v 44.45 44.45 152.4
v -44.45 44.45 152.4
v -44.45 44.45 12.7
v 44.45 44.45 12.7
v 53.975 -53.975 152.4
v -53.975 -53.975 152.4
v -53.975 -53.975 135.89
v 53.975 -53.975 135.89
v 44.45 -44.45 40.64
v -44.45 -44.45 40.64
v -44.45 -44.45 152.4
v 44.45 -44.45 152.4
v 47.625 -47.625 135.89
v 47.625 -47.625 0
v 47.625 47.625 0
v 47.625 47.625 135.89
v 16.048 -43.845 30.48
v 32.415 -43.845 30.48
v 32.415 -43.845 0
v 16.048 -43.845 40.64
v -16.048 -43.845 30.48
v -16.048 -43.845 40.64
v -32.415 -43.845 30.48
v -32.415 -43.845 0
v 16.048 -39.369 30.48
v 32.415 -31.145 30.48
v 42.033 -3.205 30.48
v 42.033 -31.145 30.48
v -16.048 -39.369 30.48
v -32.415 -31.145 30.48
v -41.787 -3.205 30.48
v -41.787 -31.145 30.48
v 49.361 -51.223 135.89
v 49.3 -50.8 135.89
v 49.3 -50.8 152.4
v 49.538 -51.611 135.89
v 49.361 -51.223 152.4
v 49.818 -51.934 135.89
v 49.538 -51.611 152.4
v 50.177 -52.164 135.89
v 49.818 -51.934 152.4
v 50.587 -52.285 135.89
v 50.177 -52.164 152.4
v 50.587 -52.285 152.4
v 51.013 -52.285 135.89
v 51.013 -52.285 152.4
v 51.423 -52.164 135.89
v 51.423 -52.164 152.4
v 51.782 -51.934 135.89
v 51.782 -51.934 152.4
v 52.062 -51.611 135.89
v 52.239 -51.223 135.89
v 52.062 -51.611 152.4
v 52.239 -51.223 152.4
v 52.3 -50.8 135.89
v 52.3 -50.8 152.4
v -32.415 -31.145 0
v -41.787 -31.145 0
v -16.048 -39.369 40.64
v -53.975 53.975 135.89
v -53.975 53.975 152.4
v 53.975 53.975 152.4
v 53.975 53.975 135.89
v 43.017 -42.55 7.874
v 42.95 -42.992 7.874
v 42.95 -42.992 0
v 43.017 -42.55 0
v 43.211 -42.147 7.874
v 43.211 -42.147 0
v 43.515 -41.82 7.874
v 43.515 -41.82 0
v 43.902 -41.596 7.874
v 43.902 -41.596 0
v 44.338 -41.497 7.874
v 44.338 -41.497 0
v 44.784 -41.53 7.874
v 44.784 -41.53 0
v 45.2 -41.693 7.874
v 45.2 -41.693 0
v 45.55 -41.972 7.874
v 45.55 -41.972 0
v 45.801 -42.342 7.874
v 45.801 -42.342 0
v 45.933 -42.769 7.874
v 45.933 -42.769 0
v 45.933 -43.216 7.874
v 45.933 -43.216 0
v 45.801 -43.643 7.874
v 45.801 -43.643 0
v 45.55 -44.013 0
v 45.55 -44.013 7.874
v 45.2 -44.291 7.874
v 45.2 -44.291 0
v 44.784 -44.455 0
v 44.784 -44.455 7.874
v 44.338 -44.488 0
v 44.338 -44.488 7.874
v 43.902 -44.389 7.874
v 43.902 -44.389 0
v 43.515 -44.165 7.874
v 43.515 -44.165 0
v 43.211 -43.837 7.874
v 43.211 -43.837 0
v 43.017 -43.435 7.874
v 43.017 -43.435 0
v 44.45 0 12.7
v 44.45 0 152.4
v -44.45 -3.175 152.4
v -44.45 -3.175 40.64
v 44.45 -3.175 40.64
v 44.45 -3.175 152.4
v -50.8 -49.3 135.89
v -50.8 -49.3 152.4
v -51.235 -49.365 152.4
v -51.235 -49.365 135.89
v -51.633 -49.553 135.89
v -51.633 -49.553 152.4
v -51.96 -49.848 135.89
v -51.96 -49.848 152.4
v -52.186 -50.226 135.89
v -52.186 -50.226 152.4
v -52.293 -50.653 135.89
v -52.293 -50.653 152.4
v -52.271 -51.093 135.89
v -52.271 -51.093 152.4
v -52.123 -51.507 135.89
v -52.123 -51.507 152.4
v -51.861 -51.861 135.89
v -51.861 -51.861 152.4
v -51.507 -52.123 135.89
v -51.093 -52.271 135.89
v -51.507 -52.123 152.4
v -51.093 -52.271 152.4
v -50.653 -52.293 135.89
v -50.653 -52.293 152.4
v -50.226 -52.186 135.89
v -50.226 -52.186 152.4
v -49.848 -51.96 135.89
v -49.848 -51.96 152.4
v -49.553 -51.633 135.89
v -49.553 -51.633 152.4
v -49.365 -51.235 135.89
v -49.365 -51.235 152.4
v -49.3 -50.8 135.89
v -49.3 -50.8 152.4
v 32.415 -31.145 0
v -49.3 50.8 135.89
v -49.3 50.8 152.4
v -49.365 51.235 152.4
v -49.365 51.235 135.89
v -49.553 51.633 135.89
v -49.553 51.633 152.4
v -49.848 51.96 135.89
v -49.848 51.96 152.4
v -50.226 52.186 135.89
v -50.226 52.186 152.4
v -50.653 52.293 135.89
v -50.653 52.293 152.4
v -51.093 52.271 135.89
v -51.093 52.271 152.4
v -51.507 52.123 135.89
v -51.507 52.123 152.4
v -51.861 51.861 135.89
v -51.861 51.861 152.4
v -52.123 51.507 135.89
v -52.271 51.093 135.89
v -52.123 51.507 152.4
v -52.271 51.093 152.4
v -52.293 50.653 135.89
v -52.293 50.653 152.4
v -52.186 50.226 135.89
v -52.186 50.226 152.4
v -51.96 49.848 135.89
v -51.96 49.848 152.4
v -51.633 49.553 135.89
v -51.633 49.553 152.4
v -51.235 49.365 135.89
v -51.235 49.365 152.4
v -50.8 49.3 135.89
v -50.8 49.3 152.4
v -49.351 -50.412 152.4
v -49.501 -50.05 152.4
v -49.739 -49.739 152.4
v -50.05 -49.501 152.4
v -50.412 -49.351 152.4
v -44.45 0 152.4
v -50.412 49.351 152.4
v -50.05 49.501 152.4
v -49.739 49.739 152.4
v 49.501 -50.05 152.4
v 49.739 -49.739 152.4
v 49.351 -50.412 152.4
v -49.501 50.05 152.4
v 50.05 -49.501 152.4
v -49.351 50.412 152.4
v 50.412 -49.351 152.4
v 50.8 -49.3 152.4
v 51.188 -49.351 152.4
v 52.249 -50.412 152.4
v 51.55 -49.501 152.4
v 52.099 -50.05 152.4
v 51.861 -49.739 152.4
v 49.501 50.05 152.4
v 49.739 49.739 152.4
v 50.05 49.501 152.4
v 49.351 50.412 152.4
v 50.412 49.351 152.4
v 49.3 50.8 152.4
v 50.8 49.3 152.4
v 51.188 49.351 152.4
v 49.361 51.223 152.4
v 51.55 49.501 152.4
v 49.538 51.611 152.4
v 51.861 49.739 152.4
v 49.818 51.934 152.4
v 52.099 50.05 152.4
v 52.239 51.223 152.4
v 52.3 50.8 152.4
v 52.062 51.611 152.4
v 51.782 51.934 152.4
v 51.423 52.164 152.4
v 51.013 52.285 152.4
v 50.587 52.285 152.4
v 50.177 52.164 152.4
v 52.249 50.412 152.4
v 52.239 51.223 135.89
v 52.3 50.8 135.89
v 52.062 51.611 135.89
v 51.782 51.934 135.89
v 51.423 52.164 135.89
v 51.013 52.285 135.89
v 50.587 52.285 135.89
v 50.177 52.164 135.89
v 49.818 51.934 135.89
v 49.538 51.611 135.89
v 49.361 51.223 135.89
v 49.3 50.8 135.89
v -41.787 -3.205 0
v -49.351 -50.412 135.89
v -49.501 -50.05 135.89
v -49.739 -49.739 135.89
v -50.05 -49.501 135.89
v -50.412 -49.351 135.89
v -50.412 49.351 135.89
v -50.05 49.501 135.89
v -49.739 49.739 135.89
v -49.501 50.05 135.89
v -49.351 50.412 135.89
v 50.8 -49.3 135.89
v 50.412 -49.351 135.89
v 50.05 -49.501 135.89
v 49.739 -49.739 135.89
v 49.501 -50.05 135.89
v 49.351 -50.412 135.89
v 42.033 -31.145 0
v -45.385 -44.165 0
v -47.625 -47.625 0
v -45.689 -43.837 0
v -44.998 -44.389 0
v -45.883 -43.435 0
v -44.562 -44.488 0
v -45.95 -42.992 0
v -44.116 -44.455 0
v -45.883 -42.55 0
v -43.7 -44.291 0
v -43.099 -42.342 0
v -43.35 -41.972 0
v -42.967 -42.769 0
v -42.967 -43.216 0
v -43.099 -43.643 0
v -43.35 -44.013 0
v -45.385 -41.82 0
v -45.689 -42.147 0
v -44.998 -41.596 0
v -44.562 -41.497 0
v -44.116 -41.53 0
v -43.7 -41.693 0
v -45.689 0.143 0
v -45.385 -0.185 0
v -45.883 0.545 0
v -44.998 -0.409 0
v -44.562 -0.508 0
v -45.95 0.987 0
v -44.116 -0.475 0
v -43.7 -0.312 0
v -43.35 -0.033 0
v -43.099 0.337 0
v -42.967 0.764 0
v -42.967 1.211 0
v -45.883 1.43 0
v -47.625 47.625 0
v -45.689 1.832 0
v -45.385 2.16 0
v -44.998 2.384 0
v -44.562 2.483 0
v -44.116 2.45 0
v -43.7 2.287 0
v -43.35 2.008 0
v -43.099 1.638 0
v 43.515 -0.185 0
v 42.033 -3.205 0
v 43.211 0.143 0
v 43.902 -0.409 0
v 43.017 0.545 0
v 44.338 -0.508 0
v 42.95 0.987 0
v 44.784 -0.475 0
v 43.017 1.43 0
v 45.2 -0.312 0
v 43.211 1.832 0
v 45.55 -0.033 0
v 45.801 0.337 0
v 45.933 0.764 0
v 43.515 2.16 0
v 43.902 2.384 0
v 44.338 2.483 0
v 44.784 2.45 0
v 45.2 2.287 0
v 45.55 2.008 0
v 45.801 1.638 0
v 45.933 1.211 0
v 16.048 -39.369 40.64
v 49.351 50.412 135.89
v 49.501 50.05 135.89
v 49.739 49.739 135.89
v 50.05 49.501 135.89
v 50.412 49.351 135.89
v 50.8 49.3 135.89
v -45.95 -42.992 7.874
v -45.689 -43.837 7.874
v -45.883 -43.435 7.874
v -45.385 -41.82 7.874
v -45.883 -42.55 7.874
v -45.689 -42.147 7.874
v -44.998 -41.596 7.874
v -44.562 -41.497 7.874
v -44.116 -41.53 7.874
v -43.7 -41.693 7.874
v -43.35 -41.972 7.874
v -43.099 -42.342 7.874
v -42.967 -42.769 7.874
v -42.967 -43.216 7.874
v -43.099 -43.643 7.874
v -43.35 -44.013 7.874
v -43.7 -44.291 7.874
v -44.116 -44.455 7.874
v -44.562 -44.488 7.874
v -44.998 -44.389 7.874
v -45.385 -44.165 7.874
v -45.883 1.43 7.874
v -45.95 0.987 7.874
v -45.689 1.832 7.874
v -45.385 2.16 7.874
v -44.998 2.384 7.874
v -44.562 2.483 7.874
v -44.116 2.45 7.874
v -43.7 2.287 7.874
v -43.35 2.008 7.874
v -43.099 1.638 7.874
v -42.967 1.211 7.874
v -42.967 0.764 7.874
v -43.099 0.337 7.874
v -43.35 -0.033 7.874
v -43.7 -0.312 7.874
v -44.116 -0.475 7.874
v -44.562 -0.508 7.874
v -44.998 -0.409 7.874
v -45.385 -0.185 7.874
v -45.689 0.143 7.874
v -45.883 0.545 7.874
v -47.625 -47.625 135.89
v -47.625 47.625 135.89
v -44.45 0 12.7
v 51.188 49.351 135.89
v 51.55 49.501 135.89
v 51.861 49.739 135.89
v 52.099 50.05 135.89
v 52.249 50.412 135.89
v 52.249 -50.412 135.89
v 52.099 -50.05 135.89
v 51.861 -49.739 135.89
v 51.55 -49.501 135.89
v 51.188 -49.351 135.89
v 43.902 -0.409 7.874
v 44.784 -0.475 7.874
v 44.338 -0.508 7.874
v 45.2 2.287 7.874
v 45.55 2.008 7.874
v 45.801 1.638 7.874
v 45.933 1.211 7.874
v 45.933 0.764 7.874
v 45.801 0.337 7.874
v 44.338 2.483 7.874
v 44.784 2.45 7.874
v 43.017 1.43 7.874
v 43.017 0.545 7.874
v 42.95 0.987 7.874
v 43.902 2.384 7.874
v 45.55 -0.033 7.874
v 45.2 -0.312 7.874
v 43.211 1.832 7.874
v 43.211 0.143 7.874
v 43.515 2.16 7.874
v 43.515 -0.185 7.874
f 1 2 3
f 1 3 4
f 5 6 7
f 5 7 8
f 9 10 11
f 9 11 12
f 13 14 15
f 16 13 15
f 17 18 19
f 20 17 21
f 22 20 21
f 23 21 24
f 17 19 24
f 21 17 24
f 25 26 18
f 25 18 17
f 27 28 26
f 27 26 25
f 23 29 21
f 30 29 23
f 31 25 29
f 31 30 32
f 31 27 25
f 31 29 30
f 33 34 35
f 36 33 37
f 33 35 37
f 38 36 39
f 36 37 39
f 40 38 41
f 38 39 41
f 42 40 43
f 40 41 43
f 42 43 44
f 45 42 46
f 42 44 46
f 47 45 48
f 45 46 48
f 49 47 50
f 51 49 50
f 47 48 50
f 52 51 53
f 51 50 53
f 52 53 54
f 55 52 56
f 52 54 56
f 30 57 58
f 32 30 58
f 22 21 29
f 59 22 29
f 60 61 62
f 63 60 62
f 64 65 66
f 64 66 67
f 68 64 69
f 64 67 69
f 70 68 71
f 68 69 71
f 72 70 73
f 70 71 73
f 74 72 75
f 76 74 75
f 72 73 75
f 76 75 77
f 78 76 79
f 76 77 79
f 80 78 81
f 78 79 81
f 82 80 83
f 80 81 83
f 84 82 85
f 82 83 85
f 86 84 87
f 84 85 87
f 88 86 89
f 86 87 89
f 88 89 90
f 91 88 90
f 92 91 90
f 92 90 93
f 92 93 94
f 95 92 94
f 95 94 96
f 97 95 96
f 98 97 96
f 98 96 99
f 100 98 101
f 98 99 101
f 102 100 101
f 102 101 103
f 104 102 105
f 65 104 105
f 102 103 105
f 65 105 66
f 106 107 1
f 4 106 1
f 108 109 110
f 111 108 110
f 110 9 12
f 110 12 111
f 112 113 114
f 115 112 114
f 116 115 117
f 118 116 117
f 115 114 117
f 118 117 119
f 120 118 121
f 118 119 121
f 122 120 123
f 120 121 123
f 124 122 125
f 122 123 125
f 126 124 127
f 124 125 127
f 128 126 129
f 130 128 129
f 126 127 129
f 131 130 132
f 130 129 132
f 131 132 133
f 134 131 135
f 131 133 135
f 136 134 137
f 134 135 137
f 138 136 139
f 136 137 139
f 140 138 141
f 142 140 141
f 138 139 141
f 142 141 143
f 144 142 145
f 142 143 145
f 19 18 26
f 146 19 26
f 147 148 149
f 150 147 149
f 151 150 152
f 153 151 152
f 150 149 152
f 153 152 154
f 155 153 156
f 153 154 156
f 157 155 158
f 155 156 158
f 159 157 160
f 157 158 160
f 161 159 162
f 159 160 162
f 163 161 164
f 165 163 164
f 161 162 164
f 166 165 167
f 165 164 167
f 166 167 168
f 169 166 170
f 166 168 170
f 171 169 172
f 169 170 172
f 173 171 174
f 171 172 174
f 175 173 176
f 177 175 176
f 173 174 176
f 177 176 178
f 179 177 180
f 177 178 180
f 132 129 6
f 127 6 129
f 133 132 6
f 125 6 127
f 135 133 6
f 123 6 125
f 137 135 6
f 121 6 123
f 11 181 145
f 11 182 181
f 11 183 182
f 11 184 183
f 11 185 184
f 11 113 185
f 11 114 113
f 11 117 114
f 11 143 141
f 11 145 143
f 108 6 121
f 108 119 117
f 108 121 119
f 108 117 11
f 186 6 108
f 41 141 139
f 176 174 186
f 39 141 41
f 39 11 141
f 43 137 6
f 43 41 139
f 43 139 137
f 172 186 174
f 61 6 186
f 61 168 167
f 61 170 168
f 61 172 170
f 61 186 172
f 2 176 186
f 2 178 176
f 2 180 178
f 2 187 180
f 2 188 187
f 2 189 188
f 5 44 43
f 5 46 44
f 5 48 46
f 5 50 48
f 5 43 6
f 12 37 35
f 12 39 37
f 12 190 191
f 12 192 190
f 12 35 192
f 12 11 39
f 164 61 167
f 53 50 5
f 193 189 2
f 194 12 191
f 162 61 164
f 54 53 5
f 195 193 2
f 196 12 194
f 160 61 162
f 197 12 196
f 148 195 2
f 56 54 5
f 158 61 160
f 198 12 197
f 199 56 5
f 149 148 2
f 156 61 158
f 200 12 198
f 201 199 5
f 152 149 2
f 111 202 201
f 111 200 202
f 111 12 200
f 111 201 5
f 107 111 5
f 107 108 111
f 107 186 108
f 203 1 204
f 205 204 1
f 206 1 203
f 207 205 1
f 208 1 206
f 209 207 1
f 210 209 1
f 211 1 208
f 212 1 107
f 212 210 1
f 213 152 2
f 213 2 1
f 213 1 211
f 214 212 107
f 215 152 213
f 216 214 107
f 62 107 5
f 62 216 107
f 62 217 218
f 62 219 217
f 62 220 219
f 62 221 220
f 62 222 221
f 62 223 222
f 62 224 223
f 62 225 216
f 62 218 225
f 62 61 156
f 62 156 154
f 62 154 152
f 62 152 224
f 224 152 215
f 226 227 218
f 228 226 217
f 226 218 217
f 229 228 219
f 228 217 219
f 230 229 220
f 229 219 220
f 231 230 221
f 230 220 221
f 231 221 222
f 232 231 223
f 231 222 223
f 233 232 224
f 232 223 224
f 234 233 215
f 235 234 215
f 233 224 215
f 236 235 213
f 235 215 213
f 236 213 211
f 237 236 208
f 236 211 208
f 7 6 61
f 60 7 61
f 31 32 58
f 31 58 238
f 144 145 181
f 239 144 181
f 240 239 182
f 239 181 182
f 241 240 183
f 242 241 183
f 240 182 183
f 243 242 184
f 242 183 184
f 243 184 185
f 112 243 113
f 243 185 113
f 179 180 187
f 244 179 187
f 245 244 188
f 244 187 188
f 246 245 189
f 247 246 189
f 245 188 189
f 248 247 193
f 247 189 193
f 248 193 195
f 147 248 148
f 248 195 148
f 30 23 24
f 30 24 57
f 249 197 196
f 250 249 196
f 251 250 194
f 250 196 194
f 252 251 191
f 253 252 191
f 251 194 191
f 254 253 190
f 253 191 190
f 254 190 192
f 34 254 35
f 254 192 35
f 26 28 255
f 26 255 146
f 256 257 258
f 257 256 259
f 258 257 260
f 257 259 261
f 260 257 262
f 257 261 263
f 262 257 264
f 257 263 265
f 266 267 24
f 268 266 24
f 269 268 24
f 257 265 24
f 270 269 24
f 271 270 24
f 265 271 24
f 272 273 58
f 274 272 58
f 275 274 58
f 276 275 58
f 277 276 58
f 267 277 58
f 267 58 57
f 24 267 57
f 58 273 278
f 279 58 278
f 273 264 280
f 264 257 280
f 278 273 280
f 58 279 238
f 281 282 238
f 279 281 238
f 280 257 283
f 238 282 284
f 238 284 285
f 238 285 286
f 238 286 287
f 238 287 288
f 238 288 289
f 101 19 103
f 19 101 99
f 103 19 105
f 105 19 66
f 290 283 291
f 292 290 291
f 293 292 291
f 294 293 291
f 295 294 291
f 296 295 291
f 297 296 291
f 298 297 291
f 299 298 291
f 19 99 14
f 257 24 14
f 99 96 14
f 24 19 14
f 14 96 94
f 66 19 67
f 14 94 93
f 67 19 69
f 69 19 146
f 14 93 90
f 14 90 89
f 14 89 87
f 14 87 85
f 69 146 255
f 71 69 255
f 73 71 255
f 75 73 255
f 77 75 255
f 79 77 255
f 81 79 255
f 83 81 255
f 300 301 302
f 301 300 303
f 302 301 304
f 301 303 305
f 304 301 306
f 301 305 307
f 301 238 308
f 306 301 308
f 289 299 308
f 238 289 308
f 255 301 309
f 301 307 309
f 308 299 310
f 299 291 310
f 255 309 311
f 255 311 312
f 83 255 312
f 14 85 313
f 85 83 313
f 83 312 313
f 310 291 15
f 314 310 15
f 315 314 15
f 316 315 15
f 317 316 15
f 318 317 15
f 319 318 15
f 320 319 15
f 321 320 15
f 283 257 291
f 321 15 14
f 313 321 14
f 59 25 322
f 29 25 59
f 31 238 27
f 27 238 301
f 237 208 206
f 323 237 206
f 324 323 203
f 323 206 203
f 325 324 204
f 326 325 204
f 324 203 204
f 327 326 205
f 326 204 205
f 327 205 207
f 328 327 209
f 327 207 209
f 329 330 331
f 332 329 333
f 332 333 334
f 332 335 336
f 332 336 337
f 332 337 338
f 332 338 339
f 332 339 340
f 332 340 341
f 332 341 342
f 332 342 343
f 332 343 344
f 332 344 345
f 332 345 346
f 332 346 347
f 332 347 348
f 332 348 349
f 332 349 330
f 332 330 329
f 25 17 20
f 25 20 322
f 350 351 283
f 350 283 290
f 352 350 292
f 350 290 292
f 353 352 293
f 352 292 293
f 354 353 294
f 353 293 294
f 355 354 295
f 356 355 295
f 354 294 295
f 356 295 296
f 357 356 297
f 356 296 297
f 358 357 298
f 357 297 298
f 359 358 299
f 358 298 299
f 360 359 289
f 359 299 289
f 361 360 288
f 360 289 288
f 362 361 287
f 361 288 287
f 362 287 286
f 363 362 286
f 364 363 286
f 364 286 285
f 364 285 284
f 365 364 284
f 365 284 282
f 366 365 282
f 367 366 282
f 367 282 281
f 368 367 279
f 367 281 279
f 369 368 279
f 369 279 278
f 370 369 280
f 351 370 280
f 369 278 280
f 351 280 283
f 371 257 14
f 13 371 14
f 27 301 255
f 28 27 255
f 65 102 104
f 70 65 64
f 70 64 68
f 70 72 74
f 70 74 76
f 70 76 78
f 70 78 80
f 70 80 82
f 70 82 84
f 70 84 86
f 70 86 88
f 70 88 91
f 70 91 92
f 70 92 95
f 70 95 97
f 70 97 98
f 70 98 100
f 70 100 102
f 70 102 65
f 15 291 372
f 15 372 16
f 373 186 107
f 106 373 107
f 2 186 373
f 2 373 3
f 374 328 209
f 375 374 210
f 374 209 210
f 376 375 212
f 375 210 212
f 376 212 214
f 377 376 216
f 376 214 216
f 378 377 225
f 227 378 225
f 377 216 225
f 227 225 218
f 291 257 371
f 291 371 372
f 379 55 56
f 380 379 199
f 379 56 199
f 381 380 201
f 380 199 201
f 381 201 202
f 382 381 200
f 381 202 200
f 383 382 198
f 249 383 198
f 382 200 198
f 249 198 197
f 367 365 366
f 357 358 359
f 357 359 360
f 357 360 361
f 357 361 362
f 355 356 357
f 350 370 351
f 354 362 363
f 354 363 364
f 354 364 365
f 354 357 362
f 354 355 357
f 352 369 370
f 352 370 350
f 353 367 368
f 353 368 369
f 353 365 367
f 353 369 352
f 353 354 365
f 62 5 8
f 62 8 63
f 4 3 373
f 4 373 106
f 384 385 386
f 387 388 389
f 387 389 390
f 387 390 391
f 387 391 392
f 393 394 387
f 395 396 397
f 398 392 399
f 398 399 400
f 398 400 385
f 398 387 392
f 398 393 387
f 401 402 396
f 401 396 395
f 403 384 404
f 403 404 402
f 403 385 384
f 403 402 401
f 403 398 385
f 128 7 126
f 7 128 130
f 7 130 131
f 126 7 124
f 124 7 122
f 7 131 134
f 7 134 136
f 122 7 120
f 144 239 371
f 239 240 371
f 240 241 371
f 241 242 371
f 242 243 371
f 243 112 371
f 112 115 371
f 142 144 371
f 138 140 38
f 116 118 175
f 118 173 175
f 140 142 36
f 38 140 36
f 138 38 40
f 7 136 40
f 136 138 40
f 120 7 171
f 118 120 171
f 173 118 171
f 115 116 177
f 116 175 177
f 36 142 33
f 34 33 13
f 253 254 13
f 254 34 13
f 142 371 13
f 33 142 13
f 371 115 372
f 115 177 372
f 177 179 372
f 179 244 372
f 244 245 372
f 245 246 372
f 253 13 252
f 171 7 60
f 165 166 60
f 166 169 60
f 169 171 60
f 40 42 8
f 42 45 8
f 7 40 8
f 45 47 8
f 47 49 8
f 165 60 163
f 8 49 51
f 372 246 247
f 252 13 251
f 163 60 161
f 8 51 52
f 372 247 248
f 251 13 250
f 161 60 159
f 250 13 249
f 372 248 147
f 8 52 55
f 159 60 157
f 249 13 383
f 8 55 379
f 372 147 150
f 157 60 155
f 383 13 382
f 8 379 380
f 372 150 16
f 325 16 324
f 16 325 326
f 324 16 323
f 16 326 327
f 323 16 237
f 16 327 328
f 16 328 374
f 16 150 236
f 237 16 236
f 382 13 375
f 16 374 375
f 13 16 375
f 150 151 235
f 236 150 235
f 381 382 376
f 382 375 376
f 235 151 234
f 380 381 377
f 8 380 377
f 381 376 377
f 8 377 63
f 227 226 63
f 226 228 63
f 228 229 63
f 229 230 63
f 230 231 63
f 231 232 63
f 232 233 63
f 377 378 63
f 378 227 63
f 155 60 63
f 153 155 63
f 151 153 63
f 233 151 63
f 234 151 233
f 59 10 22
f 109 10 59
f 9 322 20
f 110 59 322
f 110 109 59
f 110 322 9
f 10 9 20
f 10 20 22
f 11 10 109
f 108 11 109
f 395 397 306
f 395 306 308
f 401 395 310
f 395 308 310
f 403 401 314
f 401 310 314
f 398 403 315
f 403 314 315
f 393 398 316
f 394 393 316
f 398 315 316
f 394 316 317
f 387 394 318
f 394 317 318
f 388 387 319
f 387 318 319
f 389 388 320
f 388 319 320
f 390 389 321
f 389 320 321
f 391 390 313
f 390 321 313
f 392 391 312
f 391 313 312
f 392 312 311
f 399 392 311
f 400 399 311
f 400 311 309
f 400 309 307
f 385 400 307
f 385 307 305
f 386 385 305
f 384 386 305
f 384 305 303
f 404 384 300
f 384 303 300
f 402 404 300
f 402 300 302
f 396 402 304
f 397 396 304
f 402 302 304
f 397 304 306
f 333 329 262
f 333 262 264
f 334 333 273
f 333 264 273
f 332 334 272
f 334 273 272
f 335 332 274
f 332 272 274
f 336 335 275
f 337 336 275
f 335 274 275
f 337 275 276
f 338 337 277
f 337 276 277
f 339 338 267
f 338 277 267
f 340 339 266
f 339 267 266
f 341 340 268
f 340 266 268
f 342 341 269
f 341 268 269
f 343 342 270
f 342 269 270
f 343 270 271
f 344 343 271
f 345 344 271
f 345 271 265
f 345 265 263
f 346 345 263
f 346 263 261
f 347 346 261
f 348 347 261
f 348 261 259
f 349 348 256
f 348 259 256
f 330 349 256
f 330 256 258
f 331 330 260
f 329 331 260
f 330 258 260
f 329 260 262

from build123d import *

# Parameters (mm, degrees)
SKETCH1_W           = 95.25
SKETCH1_H           = 95.25
BOSS_EXTRUDE1_DEPTH = 152.4
SKETCH2_W           = 88.9
SKETCH2_H           = 44.45
CUT_EXTRUDE1_DEPTH  = 139.7
SKETCH2_3_W         = 88.9
SKETCH2_3_H         = 41.275
CUT_EXTRUDE2_DEPTH  = 111.76
SKETCH5_W           = 107.95
SKETCH5_H           = 107.95
SKETCH5_W_2         = 88.9
SKETCH5_H_2         = 88.9
BOSS_EXTRUDE2_DEPTH = 16.51
SKETCH6_R           = 1.5
CUT_EXTRUDE5_DEPTH  = 16.51
SKETCH7_R           = 1.5
CUT_EXTRUDE6_DEPTH  = 7.874
CUT_EXTRUDE7_DEPTH  = 30.48
SKETCH8_W           = 32.09515361
SKETCH8_H           = 4.475150354
CUT_EXTRUDE8_DEPTH  = 30.48


with BuildPart() as part:
    # Sketch1 → Boss-Extrude1 (new body)
    with BuildSketch(Plane.XY):
        Rectangle(SKETCH1_W, SKETCH1_H)
    extrude(amount=BOSS_EXTRUDE1_DEPTH)

    # Sketch2 → Cut-Extrude1 (cut)
    with BuildSketch(Plane.XY.offset(152.4)):
        with Locations((0, 22.225)):
            Rectangle(SKETCH2_W, SKETCH2_H)
    extrude(amount=-CUT_EXTRUDE1_DEPTH, mode=Mode.SUBTRACT)

    # Sketch2<3> → Cut-Extrude2 (cut)
    with BuildSketch(Plane.XY.offset(152.4)):
        with Locations((0, -23.8125)):
            Rectangle(SKETCH2_3_W, SKETCH2_3_H)
    extrude(amount=-CUT_EXTRUDE2_DEPTH, mode=Mode.SUBTRACT)

    # Sketch5 → Boss-Extrude2 (add)
    with BuildSketch(Plane.XY.offset(152.4)):
        Rectangle(SKETCH5_W, SKETCH5_H)
        Rectangle(SKETCH5_W_2, SKETCH5_H_2, mode=Mode.SUBTRACT)
    extrude(amount=-BOSS_EXTRUDE2_DEPTH)

    # Sketch6 → Cut-Extrude5 (cut)
    with BuildSketch(Plane.XY.offset(152.4)):
        with Locations((-50.8, 50.8)):
            Circle(SKETCH6_R)
        with Locations((50.8, 50.8)):
            Circle(SKETCH6_R)
        with Locations((-50.8, -50.8)):
            Circle(SKETCH6_R)
        with Locations((50.8, -50.8)):
            Circle(SKETCH6_R)
    extrude(amount=-CUT_EXTRUDE5_DEPTH, mode=Mode.SUBTRACT)

    # Sketch7 → Cut-Extrude6 (cut)
    with BuildSketch(Plane(origin=(0, 0, 0), x_dir=(-1, 0, 0), z_dir=(0, 0, -1))):
        with Locations((-44.45, 0.987495031)):
            Circle(SKETCH7_R)
        with Locations((44.45, 0.987495031)):
            Circle(SKETCH7_R)
        with Locations((44.45, -42.992427459)):
            Circle(SKETCH7_R)
        with Locations((-44.45, -42.992427459)):
            Circle(SKETCH7_R)
    extrude(amount=-CUT_EXTRUDE6_DEPTH, mode=Mode.SUBTRACT)

    # Sketch3 → Cut-Extrude7 (cut)
    with BuildSketch(Plane(origin=(0, 0, 0), x_dir=(-1, 0, 0), z_dir=(0, 0, -1))):
        Polygon((41.787446397, -3.204523257), (-42.032553603, -3.204523257), (-42.032553603, -31.144523257), (-32.415427886, -31.144523257), (-32.415427886, -43.844523257), (32.415427886, -43.844523257), (32.415427886, -31.144523257), (41.787446397, -31.144523257), align=None)
    extrude(amount=-CUT_EXTRUDE7_DEPTH, mode=Mode.SUBTRACT)

    # Sketch8 → Cut-Extrude8 (cut)
    with BuildSketch(Plane(origin=(0, 0, 30.48), x_dir=(-1, 0, 0), z_dir=(0, 0, -1))):
        with Locations((0, -41.60694808)):
            Rectangle(SKETCH8_W, SKETCH8_H)
    extrude(amount=-CUT_EXTRUDE8_DEPTH, mode=Mode.SUBTRACT)


solid = part.part
